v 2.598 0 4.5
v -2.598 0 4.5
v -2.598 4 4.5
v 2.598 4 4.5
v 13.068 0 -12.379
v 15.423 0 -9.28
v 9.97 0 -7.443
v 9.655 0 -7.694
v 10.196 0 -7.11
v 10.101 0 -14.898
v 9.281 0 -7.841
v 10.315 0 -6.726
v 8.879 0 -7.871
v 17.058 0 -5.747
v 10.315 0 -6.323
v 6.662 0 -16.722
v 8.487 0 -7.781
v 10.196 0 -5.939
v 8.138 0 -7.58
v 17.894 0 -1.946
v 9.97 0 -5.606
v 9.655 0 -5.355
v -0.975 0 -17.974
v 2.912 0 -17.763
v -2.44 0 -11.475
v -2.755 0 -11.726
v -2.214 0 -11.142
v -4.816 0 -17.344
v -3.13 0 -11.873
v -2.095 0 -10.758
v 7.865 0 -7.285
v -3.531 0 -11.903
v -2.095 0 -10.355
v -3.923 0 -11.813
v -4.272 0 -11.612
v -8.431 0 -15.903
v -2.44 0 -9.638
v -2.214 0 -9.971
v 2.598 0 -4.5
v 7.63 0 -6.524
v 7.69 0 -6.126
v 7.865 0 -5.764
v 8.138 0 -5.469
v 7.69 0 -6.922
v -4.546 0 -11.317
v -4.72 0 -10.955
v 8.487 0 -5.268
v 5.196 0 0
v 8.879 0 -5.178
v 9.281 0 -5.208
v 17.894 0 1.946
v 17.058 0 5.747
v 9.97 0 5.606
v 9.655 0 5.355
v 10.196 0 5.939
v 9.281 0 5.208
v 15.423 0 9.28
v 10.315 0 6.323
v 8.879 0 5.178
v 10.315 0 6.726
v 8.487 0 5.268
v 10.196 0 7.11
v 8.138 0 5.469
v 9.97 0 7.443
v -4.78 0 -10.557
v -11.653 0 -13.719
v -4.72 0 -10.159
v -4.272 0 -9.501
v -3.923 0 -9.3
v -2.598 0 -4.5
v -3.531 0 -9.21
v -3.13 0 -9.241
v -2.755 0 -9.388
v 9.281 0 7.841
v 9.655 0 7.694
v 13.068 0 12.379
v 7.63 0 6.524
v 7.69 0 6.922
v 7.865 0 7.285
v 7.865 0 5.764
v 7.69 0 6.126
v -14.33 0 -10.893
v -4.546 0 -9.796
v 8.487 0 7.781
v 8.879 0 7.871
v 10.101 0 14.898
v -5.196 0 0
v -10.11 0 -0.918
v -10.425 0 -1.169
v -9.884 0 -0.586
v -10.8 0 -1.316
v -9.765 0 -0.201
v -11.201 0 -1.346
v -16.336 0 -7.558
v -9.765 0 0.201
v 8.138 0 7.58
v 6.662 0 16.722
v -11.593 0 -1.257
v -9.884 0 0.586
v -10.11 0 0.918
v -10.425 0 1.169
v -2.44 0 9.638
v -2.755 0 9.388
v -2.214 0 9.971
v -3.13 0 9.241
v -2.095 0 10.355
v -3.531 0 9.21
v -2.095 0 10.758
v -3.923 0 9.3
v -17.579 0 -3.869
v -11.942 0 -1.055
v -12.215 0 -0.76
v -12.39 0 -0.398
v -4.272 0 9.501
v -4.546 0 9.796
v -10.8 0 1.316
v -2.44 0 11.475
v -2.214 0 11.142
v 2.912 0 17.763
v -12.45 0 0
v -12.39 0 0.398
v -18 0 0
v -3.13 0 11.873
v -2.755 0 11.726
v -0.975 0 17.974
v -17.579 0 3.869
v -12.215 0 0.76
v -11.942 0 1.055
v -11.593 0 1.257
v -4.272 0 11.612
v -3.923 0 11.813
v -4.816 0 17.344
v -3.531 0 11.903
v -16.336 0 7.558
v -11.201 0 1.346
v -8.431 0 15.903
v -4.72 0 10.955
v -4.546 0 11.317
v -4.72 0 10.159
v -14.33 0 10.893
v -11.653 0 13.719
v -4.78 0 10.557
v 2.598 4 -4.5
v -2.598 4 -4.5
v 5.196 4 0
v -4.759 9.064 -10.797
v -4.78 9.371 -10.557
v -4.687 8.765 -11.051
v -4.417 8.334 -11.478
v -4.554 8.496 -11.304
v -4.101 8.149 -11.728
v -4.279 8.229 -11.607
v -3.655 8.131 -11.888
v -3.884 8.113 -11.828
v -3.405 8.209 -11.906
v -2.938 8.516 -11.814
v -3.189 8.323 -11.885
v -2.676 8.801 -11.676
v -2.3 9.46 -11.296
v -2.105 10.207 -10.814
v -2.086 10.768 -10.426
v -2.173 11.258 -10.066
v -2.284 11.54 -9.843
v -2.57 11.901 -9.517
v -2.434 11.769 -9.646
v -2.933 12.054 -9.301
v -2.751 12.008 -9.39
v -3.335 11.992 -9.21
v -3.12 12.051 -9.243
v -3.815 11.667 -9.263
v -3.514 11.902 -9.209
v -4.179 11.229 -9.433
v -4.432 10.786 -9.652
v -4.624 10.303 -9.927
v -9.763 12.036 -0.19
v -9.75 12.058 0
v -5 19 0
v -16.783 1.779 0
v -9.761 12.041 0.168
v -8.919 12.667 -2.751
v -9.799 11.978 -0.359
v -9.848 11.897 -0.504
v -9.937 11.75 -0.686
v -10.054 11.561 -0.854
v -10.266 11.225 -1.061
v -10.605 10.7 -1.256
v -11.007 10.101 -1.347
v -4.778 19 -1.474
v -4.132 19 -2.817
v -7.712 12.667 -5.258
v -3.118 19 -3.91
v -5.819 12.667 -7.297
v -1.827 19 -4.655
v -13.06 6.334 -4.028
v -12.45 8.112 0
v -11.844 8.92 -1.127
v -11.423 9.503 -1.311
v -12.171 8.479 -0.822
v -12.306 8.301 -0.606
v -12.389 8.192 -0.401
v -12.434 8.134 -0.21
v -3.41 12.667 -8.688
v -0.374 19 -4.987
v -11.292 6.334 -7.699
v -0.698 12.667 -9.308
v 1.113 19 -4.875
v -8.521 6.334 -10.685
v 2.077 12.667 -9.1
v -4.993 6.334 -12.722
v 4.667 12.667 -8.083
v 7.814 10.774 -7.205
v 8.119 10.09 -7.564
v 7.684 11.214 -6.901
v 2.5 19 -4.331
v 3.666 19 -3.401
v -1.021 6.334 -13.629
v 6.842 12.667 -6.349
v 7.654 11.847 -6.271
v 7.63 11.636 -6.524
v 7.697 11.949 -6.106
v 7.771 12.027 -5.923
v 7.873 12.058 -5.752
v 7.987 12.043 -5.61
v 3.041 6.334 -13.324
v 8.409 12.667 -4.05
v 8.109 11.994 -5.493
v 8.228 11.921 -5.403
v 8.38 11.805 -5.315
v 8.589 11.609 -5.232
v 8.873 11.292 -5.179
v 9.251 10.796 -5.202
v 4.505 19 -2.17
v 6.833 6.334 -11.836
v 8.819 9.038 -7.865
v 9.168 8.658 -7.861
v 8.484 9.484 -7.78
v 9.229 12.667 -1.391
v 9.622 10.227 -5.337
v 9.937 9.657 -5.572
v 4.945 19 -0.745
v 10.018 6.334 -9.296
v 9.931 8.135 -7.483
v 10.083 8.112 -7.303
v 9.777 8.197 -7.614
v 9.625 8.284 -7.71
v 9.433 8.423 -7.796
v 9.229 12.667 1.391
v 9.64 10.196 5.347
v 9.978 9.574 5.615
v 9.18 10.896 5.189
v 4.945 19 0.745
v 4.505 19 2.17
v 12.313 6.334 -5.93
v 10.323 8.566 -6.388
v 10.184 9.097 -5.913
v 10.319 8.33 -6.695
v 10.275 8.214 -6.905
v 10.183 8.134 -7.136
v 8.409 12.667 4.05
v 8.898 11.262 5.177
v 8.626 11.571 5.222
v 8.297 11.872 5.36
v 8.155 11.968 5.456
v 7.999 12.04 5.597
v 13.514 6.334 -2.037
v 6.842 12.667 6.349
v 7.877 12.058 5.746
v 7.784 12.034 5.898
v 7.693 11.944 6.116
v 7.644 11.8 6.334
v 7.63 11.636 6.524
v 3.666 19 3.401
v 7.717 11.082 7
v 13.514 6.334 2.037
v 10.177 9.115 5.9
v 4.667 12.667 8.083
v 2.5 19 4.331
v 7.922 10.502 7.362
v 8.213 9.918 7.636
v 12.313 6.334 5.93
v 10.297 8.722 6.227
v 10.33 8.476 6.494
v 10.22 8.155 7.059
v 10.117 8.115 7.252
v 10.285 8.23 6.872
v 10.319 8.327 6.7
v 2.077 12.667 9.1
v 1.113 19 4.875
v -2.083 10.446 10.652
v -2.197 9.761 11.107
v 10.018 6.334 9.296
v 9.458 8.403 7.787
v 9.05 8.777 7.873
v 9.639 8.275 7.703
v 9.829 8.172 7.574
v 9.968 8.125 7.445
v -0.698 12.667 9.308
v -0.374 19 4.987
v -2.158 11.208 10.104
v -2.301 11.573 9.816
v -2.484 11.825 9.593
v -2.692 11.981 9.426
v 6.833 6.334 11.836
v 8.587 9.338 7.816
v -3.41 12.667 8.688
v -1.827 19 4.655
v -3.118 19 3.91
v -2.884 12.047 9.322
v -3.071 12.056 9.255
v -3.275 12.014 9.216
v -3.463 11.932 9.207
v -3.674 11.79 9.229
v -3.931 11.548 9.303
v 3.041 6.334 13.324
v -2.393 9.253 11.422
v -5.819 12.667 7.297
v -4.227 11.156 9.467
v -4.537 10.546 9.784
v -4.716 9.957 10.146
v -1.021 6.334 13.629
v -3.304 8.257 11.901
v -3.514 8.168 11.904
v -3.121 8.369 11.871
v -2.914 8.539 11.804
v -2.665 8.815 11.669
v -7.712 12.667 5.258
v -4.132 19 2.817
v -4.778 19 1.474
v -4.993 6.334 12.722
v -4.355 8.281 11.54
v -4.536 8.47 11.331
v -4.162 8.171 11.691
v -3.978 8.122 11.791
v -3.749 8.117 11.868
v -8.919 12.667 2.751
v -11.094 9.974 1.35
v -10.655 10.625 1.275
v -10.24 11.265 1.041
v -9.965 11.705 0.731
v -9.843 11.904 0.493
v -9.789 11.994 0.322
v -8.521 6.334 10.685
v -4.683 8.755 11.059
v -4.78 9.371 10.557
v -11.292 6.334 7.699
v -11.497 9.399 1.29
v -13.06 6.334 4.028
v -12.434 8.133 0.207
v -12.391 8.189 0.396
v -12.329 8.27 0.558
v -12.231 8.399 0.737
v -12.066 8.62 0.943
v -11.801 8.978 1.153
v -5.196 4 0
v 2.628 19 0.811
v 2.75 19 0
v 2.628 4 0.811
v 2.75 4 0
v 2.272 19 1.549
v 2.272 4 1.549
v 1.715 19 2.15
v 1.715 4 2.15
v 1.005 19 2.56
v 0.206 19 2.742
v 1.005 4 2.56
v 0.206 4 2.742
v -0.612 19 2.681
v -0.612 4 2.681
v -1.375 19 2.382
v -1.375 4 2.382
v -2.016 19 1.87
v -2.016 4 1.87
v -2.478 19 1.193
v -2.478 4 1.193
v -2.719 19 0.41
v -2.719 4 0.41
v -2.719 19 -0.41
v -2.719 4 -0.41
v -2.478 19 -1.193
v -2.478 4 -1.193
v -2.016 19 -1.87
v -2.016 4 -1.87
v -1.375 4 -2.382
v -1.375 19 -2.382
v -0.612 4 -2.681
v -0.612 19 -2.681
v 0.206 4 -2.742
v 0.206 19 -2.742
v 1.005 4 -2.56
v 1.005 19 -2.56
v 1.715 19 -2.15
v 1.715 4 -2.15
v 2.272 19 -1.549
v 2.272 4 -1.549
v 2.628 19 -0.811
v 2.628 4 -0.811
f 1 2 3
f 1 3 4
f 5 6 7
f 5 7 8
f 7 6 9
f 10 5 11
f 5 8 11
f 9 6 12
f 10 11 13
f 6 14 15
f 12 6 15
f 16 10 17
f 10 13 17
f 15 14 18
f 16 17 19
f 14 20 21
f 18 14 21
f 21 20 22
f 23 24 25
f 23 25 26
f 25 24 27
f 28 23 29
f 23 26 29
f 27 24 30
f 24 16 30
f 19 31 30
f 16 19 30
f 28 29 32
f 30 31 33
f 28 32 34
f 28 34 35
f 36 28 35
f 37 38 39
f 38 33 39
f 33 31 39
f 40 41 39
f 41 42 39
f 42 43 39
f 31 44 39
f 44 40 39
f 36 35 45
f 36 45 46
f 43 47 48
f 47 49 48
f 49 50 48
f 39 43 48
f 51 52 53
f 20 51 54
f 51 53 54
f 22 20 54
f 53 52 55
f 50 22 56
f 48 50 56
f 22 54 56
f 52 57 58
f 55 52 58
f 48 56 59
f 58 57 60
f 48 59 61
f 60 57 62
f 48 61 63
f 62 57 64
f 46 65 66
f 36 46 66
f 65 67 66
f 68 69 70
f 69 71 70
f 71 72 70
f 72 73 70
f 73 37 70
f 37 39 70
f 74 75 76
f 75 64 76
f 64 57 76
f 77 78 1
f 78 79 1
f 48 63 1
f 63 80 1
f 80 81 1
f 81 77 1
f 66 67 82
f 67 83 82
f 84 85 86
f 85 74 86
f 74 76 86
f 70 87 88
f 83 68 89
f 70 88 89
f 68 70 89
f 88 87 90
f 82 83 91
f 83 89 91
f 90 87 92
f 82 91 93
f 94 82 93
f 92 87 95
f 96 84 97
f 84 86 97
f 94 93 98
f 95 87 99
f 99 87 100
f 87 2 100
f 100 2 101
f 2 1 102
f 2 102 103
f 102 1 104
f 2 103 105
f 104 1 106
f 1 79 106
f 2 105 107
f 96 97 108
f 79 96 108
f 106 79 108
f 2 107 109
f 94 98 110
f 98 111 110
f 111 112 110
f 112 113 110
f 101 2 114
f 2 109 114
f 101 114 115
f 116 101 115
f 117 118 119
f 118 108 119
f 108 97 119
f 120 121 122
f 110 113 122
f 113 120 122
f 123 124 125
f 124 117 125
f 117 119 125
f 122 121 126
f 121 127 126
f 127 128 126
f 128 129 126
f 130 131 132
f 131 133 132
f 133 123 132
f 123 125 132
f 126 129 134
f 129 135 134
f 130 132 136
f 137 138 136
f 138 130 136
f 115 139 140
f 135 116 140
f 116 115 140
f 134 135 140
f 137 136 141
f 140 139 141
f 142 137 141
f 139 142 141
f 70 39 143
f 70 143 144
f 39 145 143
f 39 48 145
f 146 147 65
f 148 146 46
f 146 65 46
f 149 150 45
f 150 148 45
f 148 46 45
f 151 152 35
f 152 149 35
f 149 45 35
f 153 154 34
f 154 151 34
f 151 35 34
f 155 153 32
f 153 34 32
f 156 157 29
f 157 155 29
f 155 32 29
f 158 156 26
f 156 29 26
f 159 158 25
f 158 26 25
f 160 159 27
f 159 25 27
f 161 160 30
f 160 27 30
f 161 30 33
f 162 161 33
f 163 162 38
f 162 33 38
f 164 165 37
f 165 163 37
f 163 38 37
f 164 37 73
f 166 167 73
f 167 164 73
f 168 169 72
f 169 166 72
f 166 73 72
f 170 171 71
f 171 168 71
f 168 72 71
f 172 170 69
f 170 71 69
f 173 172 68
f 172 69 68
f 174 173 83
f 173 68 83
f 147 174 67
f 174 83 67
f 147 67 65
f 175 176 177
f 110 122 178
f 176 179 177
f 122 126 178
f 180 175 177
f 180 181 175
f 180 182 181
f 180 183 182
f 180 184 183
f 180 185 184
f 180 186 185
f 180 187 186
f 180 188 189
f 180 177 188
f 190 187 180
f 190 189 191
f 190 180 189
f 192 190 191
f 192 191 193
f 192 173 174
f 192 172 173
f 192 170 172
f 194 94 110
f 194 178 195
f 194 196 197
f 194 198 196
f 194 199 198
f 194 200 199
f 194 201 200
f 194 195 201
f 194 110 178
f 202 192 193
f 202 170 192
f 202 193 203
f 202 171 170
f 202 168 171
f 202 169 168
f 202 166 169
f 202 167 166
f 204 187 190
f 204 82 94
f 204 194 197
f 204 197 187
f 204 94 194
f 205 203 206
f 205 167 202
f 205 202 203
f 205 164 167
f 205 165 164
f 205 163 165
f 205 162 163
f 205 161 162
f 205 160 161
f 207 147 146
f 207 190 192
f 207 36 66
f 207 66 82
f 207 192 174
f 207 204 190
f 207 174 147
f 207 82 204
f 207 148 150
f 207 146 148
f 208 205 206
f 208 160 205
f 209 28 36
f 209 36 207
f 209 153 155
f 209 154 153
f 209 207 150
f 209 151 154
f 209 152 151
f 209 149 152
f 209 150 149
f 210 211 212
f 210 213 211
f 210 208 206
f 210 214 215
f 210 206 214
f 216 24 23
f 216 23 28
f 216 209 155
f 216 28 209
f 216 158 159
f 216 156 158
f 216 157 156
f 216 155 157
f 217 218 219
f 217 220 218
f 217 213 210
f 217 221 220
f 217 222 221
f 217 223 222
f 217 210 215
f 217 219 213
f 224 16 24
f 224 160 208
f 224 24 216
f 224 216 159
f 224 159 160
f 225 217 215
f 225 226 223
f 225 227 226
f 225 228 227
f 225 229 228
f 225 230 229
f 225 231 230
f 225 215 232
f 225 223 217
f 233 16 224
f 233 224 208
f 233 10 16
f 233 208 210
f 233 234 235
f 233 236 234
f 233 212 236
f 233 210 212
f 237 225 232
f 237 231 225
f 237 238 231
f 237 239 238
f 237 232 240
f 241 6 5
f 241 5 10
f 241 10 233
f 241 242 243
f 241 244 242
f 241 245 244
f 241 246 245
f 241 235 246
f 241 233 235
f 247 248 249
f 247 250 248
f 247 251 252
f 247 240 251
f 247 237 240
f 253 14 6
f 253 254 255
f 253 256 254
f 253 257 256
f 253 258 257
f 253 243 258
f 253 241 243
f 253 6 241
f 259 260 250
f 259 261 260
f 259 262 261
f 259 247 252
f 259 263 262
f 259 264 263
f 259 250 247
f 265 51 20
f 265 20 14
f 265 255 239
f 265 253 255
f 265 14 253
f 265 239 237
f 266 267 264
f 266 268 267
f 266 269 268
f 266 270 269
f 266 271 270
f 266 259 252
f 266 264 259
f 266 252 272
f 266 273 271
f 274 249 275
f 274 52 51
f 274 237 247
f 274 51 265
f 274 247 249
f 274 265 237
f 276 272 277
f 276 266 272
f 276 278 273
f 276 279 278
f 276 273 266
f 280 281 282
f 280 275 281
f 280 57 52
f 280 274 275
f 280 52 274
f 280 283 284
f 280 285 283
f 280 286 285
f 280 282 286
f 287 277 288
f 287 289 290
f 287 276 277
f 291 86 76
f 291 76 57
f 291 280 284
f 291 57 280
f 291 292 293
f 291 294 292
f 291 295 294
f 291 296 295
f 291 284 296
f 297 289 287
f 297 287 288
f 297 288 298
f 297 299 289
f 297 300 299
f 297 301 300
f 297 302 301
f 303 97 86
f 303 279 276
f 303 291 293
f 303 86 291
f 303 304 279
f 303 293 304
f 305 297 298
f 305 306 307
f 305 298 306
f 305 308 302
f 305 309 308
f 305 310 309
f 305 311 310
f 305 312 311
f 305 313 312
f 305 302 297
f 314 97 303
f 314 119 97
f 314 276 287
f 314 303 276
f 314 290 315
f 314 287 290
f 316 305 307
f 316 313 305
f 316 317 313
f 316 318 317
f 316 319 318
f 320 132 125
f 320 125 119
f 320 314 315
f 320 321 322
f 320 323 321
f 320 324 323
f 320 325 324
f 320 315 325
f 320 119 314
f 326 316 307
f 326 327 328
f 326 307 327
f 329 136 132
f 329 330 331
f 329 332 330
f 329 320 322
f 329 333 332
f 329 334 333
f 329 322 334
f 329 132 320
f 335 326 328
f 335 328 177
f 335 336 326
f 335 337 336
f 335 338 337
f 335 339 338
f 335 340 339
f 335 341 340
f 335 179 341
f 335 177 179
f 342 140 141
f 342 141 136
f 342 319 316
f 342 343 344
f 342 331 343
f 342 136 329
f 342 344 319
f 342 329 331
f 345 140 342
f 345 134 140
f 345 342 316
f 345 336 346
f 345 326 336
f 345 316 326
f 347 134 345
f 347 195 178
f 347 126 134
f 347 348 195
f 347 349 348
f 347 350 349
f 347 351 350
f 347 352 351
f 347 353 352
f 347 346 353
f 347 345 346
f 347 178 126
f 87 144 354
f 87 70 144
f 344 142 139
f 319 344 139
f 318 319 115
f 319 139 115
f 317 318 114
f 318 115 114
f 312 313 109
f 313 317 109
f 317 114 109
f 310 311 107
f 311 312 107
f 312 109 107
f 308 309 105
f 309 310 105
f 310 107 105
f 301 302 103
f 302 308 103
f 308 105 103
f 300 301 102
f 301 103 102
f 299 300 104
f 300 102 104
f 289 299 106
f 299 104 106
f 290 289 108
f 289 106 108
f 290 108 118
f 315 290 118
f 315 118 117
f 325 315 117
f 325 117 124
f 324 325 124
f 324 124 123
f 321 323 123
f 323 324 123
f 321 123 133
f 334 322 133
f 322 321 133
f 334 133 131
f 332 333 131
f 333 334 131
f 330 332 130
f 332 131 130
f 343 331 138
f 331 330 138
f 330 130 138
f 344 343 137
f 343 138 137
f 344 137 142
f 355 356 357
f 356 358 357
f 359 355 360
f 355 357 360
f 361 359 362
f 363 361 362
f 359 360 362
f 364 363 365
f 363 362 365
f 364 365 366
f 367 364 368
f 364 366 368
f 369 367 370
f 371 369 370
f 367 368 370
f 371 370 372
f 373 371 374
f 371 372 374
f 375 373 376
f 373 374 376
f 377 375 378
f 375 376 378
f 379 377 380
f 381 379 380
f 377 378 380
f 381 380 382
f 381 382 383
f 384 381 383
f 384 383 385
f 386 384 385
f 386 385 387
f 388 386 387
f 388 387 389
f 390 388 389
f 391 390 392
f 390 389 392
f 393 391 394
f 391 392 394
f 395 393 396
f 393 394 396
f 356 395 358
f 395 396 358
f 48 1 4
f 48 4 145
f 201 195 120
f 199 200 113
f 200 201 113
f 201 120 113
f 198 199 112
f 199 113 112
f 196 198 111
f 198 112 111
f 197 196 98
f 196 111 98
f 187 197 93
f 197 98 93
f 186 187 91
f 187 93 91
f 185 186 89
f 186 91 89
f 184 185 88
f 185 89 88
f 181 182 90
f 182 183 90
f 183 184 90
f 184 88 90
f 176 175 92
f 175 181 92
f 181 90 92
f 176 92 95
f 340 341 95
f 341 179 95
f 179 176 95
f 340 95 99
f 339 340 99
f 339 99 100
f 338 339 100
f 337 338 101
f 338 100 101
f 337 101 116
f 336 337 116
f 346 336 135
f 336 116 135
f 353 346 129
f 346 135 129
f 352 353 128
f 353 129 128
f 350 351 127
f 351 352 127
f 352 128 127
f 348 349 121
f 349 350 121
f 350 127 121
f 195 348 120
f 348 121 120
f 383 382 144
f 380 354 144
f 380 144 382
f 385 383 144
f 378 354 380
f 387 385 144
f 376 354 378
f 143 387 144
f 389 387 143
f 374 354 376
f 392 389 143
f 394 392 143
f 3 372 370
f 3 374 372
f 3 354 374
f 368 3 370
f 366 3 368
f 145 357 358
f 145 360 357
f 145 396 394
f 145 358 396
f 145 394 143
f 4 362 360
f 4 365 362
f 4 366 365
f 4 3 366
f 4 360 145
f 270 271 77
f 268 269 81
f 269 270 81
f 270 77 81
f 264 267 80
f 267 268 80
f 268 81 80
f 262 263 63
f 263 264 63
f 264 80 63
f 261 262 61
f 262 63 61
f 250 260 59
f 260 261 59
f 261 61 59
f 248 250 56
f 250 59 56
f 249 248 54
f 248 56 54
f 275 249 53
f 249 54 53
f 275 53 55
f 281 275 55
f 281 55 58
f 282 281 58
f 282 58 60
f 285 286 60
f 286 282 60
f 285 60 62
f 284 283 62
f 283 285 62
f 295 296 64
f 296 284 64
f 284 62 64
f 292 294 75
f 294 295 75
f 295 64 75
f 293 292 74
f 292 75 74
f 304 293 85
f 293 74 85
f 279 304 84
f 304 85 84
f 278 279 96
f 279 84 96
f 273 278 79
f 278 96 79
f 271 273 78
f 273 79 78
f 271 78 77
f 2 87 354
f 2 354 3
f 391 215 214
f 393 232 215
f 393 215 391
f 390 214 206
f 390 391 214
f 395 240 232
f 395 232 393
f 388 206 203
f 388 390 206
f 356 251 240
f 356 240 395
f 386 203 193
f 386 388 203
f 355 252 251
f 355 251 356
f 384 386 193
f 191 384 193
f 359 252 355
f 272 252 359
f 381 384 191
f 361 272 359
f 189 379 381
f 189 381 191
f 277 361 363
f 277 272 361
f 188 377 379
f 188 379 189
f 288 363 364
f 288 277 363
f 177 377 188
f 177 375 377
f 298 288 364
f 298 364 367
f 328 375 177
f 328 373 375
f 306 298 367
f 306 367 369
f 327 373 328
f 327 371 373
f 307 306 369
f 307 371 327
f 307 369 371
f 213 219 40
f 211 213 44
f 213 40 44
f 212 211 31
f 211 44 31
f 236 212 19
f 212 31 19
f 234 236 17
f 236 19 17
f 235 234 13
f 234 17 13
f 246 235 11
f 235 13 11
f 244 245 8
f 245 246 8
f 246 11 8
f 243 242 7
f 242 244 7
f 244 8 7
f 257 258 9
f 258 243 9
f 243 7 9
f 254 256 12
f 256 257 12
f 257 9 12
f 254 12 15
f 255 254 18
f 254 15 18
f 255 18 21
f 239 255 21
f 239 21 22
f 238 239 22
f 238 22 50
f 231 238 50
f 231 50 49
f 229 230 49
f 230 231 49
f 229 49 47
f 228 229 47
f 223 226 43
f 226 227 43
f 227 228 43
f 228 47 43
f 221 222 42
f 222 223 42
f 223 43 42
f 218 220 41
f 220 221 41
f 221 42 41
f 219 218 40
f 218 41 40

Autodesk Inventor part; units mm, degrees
ref_plane "YZ Plane" through (0, 0, 0) normal (1, 0, 0) x (0, 1, 0)
ref_plane "XZ Plane" through (0, 0, 0) normal (0, 1, 0) x (-1, 0, 0)
ref_plane "XY Plane" through (0, 0, 0) normal (0, 0, 1) x (1, 0, 0)
sketch "Sketch1" plane through (0, 0, 0) normal (0, 1, 0) x (-1, 0, 0)
  circle A0 centre (0, 0) radius 18
  line L0 (10.3065, -1.0922) -> (4.2236, -9.4646)
  line L1 (2.1462, -10.1396) -> (-7.6962, -6.9416)
  line L2 (-8.9801, -5.1744) -> (-8.9801, 5.1744)
  line L3 (-7.6962, 6.9416) -> (2.1462, 10.1396)
  line L4 (4.2236, 9.4646) -> (10.3065, 1.0922)
  circle A1 centre (3.4301, 10.5567) radius 1.35
  circle A2 centre (11.1, 0) radius 1.35
  circle A3 centre (-8.9801, 6.5244) radius 1.35
  circle A4 centre (-8.9801, -6.5244) radius 1.35
  circle A5 centre (3.4301, -10.5567) radius 1.35
  arc A6 (11.0179, 1.3475) -> (4.6863, 10.0622) centre (0, 0) ccw
  arc A7 (4.6863, -10.0622) -> (11.0179, -1.3475) centre (0, 0) ccw
  arc A8 (-8.1216, -7.5663) -> (2.1232, -10.8951) centre (0, 0) ccw
  arc A9 (2.1232, 10.8951) -> (-8.1216, 7.5663) centre (0, 0) ccw
  arc A10 (-9.7057, 5.386) -> (-9.7057, -5.386) centre (0, 0) ccw
  dimension "d0" = 36
  dimension "d2" = 2.7
  dimension "d3" = 2.7
  dimension "d4" = 2.7
  dimension "d5" = 2.7
  dimension "d6" = 2.7
extrude "Extrusion1" add sketch "Sketch1" along normal blind 19 contours A0 | A2 A7 A5 L0 | L0 A5 L1 A4 L2 A3 L3 A1 L4 A2 | A2 | A5 | L4 A1 A6 A2 | A5 A8 A4 L1 | A1 | A4 | L3 A3 A9 A1 | A3 | A10 A3 L2 A4
sketch "Sketch3" plane through (0, 0, 0) normal (0, -1, 0) x (1, 0, 0)
  circle A0 centre (0, 0) radius 18 projected
  line L0 (-5.1962, 0) -> (-2.5981, 4.5)
  line L1 (-2.5981, 4.5) -> (2.5981, 4.5)
  line L2 (2.5981, 4.5) -> (5.1962, 0)
  line L3 (5.1962, 0) -> (2.5981, -4.5)
  line L4 (2.5981, -4.5) -> (-2.5981, -4.5)
  line L5 (-2.5981, -4.5) -> (-5.1962, 0)
  dimension "d23" = 9
extrude "Extrusion3" cut sketch "Sketch3" against normal blind 4 contours L0 L1 L2 L3 L4 L5
sketch "Sketch4" plane through (0, 4, 0) normal (0, -1, 0) x (1, 0, 0)
  circle A0 centre (0, 0) radius 2.75
  dimension "d26" = 5.5
extrude "Extrusion4" cut sketch "Sketch4" against normal blind 17
chamfer "Chamfer2" distance 13 distance2 19 1 edges at (18, 19, 0) measured on face at (-12.7157, 19, -1.6553)
extrude "Extrusion5" cut sketch "Sketch1" along normal blind 14 contours A2 | A5 | A1 | A4 | A3
equation "\"BendRadius\" = Thickness"
equation "\"BendReliefWidth\" = Thickness"
equation "\"BendReliefDepth\" = 0.5 * Thickness"
equation "\"CornerReliefSize\" = 4 * Thickness"
equation "\"MinimumRemnant\" = 2 * Thickness"
equation "\"TransitionRadius\" = BendRadius"
equation "\"JacobiRadiusSize\" = BendRadius"
equation "\"GapSize\" = Thickness"
equation "\"Thickness\" = 0.5"
properties part number "motorSupportShaft"
